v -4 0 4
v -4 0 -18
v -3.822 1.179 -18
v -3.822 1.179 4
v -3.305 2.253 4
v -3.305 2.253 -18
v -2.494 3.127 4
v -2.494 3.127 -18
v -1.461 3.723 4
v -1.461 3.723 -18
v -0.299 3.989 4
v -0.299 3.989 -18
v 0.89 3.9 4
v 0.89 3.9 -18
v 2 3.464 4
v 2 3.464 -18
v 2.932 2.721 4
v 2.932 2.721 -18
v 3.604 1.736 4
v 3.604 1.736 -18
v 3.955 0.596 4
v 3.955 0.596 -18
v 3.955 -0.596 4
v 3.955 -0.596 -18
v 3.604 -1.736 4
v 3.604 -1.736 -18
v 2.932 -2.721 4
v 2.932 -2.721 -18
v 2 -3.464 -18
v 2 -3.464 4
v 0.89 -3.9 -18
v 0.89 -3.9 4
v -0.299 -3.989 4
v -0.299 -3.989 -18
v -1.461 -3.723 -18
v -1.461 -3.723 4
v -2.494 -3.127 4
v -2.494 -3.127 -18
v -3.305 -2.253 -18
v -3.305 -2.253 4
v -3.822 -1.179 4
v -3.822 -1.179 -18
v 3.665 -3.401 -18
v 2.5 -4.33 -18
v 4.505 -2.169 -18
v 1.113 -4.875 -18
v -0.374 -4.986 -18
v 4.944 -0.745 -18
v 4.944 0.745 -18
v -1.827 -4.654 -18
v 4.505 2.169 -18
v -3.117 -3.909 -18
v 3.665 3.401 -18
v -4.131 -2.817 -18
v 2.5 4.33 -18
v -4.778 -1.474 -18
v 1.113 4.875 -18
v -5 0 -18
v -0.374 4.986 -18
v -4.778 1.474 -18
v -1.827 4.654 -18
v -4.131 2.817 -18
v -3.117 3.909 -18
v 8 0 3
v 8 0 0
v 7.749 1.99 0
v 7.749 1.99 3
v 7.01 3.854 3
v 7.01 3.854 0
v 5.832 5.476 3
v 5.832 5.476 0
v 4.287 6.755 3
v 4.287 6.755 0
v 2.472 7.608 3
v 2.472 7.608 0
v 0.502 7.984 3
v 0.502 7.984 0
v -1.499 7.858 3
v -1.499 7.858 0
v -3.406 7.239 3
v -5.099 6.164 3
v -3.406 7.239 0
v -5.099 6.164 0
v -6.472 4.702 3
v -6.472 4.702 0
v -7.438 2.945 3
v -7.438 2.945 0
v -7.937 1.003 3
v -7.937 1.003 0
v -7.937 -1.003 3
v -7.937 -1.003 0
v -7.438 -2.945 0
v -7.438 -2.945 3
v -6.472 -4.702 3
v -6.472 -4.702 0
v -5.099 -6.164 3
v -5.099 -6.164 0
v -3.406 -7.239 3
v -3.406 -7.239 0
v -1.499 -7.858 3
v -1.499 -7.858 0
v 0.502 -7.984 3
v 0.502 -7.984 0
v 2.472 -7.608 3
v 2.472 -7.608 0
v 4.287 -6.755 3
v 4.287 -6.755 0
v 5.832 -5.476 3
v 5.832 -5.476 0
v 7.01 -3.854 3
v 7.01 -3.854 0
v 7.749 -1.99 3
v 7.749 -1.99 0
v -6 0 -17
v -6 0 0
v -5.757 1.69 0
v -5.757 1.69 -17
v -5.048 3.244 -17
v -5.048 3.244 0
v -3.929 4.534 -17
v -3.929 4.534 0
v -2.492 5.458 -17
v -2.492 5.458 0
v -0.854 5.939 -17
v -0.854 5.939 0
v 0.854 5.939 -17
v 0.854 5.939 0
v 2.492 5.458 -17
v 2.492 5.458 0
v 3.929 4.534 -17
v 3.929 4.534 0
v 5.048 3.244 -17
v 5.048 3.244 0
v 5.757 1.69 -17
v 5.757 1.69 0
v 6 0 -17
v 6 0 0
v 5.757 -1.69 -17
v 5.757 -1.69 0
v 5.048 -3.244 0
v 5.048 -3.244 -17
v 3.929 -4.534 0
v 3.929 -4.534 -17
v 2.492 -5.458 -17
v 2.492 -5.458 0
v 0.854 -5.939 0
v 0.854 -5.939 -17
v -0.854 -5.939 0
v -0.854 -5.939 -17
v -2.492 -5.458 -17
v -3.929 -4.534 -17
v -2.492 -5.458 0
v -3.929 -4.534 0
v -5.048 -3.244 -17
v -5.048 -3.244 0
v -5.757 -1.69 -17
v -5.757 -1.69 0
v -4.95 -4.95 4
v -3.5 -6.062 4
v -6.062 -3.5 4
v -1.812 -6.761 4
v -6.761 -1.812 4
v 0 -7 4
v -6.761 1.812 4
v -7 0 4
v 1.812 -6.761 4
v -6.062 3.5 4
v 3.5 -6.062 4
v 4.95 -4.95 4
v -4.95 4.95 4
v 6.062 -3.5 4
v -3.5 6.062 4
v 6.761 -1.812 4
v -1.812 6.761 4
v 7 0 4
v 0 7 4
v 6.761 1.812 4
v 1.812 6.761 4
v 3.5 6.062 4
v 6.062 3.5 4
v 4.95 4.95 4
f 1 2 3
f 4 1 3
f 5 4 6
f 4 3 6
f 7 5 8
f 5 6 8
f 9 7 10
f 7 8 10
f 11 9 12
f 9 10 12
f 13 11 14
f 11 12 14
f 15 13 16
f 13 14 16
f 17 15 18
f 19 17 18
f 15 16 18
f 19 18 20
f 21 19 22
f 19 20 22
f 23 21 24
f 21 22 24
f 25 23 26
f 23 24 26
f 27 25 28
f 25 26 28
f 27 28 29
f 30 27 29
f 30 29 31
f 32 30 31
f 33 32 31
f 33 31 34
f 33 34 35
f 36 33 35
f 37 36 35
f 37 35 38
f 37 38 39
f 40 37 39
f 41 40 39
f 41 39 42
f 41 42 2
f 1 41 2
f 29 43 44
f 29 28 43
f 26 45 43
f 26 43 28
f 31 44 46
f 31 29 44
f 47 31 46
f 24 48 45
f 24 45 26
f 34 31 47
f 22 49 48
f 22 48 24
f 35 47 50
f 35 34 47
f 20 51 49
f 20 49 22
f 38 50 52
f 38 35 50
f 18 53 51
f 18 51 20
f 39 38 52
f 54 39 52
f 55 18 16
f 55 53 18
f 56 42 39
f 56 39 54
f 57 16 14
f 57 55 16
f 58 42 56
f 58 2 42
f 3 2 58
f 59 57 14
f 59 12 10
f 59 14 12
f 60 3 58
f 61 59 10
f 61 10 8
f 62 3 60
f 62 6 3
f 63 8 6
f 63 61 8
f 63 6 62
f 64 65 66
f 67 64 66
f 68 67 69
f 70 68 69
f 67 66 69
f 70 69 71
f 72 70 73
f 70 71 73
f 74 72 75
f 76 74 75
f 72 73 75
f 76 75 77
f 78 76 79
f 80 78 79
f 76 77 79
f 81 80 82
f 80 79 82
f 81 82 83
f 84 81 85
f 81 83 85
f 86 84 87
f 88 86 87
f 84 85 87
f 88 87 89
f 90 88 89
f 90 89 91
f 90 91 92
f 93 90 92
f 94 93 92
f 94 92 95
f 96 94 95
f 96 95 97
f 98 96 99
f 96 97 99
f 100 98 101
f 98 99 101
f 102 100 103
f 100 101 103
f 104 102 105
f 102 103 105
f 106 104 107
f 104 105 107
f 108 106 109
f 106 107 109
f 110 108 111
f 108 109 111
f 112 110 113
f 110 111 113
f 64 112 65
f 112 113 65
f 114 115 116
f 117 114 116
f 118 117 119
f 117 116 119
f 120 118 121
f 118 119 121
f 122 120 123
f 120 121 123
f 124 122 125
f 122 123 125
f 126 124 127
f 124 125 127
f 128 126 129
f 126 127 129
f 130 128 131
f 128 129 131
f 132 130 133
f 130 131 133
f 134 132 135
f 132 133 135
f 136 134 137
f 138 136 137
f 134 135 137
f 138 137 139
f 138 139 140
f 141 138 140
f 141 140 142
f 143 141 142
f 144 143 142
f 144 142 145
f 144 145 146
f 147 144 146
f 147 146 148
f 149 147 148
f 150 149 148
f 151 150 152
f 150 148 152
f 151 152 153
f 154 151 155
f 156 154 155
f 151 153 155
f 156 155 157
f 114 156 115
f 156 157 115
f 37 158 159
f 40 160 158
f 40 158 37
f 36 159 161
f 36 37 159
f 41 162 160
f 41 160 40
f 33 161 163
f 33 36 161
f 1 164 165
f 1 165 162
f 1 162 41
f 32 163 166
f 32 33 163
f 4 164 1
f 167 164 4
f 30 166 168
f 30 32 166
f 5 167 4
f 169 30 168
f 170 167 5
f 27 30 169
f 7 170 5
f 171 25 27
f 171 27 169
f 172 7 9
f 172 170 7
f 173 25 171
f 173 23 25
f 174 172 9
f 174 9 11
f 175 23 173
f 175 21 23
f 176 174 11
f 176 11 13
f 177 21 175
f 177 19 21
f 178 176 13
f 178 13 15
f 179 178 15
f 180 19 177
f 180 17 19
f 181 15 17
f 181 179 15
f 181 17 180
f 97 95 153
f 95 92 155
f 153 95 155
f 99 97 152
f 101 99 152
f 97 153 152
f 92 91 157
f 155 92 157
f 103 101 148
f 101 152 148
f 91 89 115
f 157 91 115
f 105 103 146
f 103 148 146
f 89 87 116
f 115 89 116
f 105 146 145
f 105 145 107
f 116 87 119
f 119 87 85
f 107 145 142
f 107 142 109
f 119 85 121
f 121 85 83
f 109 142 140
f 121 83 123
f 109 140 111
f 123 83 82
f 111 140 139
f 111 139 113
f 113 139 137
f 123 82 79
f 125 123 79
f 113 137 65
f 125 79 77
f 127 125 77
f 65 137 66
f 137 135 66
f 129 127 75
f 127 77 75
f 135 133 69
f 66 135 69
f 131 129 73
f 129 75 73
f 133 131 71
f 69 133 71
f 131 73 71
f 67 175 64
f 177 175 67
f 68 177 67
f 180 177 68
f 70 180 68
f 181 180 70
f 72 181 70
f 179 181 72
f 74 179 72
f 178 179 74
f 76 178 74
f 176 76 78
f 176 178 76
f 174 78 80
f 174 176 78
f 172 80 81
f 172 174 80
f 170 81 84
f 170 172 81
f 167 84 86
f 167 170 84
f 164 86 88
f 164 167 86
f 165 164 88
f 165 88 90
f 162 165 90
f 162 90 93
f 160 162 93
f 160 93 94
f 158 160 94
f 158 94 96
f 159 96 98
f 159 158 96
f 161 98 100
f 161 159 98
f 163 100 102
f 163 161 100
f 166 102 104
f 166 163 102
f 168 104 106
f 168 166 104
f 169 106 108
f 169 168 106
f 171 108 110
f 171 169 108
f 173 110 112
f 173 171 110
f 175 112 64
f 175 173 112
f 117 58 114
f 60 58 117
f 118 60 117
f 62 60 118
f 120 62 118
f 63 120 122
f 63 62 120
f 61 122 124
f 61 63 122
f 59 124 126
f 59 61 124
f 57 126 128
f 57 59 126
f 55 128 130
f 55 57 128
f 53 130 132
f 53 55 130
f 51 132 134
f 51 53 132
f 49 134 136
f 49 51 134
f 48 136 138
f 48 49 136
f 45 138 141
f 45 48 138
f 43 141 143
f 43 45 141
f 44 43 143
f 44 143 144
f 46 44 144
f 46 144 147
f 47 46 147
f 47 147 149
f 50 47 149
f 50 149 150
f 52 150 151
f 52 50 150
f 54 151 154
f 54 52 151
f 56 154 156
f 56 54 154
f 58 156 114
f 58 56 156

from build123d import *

# Parameters (mm, degrees)
SKETCH_1_R          = 8
EXTRUDE_1_DEPTH     = 4
SKETCH_2_R          = 6
EXTRUDE_2_DEPTH     = 18
SKETCH_3_R          = 4
CUT_EXTRUDE_1_DEPTH = 23
CHAMFER_1_SIZE      = 1


with BuildPart() as part:
    # 스케치1 → 보스-돌출1 (new body)
    with BuildSketch(Plane.XY):
        Circle(SKETCH_1_R)
    extrude(amount=EXTRUDE_1_DEPTH)

    # 스케치2 → 보스-돌출2 (add)
    with BuildSketch(Plane(origin=(0, 0, 0), x_dir=(-1, 0, 0), z_dir=(0, 0, -1))):
        Circle(SKETCH_2_R)
    extrude(amount=EXTRUDE_2_DEPTH)

    # 스케치3 → 컷-돌출1 (cut, through all)
    with BuildSketch(Plane(origin=(0, 0, -18), x_dir=(-1, 0, 0), z_dir=(0, 0, -1))):
        Circle(SKETCH_3_R)
    extrude(amount=-CUT_EXTRUDE_1_DEPTH, mode=Mode.SUBTRACT)

    # 모따기1
    chamfer_1_edges = [part.edges().sort_by_distance(p)[0] for p in [
        (-8, 0, 4),
        (6, 0, -18),
    ]]
    chamfer(chamfer_1_edges, length=CHAMFER_1_SIZE)


solid = part.part
